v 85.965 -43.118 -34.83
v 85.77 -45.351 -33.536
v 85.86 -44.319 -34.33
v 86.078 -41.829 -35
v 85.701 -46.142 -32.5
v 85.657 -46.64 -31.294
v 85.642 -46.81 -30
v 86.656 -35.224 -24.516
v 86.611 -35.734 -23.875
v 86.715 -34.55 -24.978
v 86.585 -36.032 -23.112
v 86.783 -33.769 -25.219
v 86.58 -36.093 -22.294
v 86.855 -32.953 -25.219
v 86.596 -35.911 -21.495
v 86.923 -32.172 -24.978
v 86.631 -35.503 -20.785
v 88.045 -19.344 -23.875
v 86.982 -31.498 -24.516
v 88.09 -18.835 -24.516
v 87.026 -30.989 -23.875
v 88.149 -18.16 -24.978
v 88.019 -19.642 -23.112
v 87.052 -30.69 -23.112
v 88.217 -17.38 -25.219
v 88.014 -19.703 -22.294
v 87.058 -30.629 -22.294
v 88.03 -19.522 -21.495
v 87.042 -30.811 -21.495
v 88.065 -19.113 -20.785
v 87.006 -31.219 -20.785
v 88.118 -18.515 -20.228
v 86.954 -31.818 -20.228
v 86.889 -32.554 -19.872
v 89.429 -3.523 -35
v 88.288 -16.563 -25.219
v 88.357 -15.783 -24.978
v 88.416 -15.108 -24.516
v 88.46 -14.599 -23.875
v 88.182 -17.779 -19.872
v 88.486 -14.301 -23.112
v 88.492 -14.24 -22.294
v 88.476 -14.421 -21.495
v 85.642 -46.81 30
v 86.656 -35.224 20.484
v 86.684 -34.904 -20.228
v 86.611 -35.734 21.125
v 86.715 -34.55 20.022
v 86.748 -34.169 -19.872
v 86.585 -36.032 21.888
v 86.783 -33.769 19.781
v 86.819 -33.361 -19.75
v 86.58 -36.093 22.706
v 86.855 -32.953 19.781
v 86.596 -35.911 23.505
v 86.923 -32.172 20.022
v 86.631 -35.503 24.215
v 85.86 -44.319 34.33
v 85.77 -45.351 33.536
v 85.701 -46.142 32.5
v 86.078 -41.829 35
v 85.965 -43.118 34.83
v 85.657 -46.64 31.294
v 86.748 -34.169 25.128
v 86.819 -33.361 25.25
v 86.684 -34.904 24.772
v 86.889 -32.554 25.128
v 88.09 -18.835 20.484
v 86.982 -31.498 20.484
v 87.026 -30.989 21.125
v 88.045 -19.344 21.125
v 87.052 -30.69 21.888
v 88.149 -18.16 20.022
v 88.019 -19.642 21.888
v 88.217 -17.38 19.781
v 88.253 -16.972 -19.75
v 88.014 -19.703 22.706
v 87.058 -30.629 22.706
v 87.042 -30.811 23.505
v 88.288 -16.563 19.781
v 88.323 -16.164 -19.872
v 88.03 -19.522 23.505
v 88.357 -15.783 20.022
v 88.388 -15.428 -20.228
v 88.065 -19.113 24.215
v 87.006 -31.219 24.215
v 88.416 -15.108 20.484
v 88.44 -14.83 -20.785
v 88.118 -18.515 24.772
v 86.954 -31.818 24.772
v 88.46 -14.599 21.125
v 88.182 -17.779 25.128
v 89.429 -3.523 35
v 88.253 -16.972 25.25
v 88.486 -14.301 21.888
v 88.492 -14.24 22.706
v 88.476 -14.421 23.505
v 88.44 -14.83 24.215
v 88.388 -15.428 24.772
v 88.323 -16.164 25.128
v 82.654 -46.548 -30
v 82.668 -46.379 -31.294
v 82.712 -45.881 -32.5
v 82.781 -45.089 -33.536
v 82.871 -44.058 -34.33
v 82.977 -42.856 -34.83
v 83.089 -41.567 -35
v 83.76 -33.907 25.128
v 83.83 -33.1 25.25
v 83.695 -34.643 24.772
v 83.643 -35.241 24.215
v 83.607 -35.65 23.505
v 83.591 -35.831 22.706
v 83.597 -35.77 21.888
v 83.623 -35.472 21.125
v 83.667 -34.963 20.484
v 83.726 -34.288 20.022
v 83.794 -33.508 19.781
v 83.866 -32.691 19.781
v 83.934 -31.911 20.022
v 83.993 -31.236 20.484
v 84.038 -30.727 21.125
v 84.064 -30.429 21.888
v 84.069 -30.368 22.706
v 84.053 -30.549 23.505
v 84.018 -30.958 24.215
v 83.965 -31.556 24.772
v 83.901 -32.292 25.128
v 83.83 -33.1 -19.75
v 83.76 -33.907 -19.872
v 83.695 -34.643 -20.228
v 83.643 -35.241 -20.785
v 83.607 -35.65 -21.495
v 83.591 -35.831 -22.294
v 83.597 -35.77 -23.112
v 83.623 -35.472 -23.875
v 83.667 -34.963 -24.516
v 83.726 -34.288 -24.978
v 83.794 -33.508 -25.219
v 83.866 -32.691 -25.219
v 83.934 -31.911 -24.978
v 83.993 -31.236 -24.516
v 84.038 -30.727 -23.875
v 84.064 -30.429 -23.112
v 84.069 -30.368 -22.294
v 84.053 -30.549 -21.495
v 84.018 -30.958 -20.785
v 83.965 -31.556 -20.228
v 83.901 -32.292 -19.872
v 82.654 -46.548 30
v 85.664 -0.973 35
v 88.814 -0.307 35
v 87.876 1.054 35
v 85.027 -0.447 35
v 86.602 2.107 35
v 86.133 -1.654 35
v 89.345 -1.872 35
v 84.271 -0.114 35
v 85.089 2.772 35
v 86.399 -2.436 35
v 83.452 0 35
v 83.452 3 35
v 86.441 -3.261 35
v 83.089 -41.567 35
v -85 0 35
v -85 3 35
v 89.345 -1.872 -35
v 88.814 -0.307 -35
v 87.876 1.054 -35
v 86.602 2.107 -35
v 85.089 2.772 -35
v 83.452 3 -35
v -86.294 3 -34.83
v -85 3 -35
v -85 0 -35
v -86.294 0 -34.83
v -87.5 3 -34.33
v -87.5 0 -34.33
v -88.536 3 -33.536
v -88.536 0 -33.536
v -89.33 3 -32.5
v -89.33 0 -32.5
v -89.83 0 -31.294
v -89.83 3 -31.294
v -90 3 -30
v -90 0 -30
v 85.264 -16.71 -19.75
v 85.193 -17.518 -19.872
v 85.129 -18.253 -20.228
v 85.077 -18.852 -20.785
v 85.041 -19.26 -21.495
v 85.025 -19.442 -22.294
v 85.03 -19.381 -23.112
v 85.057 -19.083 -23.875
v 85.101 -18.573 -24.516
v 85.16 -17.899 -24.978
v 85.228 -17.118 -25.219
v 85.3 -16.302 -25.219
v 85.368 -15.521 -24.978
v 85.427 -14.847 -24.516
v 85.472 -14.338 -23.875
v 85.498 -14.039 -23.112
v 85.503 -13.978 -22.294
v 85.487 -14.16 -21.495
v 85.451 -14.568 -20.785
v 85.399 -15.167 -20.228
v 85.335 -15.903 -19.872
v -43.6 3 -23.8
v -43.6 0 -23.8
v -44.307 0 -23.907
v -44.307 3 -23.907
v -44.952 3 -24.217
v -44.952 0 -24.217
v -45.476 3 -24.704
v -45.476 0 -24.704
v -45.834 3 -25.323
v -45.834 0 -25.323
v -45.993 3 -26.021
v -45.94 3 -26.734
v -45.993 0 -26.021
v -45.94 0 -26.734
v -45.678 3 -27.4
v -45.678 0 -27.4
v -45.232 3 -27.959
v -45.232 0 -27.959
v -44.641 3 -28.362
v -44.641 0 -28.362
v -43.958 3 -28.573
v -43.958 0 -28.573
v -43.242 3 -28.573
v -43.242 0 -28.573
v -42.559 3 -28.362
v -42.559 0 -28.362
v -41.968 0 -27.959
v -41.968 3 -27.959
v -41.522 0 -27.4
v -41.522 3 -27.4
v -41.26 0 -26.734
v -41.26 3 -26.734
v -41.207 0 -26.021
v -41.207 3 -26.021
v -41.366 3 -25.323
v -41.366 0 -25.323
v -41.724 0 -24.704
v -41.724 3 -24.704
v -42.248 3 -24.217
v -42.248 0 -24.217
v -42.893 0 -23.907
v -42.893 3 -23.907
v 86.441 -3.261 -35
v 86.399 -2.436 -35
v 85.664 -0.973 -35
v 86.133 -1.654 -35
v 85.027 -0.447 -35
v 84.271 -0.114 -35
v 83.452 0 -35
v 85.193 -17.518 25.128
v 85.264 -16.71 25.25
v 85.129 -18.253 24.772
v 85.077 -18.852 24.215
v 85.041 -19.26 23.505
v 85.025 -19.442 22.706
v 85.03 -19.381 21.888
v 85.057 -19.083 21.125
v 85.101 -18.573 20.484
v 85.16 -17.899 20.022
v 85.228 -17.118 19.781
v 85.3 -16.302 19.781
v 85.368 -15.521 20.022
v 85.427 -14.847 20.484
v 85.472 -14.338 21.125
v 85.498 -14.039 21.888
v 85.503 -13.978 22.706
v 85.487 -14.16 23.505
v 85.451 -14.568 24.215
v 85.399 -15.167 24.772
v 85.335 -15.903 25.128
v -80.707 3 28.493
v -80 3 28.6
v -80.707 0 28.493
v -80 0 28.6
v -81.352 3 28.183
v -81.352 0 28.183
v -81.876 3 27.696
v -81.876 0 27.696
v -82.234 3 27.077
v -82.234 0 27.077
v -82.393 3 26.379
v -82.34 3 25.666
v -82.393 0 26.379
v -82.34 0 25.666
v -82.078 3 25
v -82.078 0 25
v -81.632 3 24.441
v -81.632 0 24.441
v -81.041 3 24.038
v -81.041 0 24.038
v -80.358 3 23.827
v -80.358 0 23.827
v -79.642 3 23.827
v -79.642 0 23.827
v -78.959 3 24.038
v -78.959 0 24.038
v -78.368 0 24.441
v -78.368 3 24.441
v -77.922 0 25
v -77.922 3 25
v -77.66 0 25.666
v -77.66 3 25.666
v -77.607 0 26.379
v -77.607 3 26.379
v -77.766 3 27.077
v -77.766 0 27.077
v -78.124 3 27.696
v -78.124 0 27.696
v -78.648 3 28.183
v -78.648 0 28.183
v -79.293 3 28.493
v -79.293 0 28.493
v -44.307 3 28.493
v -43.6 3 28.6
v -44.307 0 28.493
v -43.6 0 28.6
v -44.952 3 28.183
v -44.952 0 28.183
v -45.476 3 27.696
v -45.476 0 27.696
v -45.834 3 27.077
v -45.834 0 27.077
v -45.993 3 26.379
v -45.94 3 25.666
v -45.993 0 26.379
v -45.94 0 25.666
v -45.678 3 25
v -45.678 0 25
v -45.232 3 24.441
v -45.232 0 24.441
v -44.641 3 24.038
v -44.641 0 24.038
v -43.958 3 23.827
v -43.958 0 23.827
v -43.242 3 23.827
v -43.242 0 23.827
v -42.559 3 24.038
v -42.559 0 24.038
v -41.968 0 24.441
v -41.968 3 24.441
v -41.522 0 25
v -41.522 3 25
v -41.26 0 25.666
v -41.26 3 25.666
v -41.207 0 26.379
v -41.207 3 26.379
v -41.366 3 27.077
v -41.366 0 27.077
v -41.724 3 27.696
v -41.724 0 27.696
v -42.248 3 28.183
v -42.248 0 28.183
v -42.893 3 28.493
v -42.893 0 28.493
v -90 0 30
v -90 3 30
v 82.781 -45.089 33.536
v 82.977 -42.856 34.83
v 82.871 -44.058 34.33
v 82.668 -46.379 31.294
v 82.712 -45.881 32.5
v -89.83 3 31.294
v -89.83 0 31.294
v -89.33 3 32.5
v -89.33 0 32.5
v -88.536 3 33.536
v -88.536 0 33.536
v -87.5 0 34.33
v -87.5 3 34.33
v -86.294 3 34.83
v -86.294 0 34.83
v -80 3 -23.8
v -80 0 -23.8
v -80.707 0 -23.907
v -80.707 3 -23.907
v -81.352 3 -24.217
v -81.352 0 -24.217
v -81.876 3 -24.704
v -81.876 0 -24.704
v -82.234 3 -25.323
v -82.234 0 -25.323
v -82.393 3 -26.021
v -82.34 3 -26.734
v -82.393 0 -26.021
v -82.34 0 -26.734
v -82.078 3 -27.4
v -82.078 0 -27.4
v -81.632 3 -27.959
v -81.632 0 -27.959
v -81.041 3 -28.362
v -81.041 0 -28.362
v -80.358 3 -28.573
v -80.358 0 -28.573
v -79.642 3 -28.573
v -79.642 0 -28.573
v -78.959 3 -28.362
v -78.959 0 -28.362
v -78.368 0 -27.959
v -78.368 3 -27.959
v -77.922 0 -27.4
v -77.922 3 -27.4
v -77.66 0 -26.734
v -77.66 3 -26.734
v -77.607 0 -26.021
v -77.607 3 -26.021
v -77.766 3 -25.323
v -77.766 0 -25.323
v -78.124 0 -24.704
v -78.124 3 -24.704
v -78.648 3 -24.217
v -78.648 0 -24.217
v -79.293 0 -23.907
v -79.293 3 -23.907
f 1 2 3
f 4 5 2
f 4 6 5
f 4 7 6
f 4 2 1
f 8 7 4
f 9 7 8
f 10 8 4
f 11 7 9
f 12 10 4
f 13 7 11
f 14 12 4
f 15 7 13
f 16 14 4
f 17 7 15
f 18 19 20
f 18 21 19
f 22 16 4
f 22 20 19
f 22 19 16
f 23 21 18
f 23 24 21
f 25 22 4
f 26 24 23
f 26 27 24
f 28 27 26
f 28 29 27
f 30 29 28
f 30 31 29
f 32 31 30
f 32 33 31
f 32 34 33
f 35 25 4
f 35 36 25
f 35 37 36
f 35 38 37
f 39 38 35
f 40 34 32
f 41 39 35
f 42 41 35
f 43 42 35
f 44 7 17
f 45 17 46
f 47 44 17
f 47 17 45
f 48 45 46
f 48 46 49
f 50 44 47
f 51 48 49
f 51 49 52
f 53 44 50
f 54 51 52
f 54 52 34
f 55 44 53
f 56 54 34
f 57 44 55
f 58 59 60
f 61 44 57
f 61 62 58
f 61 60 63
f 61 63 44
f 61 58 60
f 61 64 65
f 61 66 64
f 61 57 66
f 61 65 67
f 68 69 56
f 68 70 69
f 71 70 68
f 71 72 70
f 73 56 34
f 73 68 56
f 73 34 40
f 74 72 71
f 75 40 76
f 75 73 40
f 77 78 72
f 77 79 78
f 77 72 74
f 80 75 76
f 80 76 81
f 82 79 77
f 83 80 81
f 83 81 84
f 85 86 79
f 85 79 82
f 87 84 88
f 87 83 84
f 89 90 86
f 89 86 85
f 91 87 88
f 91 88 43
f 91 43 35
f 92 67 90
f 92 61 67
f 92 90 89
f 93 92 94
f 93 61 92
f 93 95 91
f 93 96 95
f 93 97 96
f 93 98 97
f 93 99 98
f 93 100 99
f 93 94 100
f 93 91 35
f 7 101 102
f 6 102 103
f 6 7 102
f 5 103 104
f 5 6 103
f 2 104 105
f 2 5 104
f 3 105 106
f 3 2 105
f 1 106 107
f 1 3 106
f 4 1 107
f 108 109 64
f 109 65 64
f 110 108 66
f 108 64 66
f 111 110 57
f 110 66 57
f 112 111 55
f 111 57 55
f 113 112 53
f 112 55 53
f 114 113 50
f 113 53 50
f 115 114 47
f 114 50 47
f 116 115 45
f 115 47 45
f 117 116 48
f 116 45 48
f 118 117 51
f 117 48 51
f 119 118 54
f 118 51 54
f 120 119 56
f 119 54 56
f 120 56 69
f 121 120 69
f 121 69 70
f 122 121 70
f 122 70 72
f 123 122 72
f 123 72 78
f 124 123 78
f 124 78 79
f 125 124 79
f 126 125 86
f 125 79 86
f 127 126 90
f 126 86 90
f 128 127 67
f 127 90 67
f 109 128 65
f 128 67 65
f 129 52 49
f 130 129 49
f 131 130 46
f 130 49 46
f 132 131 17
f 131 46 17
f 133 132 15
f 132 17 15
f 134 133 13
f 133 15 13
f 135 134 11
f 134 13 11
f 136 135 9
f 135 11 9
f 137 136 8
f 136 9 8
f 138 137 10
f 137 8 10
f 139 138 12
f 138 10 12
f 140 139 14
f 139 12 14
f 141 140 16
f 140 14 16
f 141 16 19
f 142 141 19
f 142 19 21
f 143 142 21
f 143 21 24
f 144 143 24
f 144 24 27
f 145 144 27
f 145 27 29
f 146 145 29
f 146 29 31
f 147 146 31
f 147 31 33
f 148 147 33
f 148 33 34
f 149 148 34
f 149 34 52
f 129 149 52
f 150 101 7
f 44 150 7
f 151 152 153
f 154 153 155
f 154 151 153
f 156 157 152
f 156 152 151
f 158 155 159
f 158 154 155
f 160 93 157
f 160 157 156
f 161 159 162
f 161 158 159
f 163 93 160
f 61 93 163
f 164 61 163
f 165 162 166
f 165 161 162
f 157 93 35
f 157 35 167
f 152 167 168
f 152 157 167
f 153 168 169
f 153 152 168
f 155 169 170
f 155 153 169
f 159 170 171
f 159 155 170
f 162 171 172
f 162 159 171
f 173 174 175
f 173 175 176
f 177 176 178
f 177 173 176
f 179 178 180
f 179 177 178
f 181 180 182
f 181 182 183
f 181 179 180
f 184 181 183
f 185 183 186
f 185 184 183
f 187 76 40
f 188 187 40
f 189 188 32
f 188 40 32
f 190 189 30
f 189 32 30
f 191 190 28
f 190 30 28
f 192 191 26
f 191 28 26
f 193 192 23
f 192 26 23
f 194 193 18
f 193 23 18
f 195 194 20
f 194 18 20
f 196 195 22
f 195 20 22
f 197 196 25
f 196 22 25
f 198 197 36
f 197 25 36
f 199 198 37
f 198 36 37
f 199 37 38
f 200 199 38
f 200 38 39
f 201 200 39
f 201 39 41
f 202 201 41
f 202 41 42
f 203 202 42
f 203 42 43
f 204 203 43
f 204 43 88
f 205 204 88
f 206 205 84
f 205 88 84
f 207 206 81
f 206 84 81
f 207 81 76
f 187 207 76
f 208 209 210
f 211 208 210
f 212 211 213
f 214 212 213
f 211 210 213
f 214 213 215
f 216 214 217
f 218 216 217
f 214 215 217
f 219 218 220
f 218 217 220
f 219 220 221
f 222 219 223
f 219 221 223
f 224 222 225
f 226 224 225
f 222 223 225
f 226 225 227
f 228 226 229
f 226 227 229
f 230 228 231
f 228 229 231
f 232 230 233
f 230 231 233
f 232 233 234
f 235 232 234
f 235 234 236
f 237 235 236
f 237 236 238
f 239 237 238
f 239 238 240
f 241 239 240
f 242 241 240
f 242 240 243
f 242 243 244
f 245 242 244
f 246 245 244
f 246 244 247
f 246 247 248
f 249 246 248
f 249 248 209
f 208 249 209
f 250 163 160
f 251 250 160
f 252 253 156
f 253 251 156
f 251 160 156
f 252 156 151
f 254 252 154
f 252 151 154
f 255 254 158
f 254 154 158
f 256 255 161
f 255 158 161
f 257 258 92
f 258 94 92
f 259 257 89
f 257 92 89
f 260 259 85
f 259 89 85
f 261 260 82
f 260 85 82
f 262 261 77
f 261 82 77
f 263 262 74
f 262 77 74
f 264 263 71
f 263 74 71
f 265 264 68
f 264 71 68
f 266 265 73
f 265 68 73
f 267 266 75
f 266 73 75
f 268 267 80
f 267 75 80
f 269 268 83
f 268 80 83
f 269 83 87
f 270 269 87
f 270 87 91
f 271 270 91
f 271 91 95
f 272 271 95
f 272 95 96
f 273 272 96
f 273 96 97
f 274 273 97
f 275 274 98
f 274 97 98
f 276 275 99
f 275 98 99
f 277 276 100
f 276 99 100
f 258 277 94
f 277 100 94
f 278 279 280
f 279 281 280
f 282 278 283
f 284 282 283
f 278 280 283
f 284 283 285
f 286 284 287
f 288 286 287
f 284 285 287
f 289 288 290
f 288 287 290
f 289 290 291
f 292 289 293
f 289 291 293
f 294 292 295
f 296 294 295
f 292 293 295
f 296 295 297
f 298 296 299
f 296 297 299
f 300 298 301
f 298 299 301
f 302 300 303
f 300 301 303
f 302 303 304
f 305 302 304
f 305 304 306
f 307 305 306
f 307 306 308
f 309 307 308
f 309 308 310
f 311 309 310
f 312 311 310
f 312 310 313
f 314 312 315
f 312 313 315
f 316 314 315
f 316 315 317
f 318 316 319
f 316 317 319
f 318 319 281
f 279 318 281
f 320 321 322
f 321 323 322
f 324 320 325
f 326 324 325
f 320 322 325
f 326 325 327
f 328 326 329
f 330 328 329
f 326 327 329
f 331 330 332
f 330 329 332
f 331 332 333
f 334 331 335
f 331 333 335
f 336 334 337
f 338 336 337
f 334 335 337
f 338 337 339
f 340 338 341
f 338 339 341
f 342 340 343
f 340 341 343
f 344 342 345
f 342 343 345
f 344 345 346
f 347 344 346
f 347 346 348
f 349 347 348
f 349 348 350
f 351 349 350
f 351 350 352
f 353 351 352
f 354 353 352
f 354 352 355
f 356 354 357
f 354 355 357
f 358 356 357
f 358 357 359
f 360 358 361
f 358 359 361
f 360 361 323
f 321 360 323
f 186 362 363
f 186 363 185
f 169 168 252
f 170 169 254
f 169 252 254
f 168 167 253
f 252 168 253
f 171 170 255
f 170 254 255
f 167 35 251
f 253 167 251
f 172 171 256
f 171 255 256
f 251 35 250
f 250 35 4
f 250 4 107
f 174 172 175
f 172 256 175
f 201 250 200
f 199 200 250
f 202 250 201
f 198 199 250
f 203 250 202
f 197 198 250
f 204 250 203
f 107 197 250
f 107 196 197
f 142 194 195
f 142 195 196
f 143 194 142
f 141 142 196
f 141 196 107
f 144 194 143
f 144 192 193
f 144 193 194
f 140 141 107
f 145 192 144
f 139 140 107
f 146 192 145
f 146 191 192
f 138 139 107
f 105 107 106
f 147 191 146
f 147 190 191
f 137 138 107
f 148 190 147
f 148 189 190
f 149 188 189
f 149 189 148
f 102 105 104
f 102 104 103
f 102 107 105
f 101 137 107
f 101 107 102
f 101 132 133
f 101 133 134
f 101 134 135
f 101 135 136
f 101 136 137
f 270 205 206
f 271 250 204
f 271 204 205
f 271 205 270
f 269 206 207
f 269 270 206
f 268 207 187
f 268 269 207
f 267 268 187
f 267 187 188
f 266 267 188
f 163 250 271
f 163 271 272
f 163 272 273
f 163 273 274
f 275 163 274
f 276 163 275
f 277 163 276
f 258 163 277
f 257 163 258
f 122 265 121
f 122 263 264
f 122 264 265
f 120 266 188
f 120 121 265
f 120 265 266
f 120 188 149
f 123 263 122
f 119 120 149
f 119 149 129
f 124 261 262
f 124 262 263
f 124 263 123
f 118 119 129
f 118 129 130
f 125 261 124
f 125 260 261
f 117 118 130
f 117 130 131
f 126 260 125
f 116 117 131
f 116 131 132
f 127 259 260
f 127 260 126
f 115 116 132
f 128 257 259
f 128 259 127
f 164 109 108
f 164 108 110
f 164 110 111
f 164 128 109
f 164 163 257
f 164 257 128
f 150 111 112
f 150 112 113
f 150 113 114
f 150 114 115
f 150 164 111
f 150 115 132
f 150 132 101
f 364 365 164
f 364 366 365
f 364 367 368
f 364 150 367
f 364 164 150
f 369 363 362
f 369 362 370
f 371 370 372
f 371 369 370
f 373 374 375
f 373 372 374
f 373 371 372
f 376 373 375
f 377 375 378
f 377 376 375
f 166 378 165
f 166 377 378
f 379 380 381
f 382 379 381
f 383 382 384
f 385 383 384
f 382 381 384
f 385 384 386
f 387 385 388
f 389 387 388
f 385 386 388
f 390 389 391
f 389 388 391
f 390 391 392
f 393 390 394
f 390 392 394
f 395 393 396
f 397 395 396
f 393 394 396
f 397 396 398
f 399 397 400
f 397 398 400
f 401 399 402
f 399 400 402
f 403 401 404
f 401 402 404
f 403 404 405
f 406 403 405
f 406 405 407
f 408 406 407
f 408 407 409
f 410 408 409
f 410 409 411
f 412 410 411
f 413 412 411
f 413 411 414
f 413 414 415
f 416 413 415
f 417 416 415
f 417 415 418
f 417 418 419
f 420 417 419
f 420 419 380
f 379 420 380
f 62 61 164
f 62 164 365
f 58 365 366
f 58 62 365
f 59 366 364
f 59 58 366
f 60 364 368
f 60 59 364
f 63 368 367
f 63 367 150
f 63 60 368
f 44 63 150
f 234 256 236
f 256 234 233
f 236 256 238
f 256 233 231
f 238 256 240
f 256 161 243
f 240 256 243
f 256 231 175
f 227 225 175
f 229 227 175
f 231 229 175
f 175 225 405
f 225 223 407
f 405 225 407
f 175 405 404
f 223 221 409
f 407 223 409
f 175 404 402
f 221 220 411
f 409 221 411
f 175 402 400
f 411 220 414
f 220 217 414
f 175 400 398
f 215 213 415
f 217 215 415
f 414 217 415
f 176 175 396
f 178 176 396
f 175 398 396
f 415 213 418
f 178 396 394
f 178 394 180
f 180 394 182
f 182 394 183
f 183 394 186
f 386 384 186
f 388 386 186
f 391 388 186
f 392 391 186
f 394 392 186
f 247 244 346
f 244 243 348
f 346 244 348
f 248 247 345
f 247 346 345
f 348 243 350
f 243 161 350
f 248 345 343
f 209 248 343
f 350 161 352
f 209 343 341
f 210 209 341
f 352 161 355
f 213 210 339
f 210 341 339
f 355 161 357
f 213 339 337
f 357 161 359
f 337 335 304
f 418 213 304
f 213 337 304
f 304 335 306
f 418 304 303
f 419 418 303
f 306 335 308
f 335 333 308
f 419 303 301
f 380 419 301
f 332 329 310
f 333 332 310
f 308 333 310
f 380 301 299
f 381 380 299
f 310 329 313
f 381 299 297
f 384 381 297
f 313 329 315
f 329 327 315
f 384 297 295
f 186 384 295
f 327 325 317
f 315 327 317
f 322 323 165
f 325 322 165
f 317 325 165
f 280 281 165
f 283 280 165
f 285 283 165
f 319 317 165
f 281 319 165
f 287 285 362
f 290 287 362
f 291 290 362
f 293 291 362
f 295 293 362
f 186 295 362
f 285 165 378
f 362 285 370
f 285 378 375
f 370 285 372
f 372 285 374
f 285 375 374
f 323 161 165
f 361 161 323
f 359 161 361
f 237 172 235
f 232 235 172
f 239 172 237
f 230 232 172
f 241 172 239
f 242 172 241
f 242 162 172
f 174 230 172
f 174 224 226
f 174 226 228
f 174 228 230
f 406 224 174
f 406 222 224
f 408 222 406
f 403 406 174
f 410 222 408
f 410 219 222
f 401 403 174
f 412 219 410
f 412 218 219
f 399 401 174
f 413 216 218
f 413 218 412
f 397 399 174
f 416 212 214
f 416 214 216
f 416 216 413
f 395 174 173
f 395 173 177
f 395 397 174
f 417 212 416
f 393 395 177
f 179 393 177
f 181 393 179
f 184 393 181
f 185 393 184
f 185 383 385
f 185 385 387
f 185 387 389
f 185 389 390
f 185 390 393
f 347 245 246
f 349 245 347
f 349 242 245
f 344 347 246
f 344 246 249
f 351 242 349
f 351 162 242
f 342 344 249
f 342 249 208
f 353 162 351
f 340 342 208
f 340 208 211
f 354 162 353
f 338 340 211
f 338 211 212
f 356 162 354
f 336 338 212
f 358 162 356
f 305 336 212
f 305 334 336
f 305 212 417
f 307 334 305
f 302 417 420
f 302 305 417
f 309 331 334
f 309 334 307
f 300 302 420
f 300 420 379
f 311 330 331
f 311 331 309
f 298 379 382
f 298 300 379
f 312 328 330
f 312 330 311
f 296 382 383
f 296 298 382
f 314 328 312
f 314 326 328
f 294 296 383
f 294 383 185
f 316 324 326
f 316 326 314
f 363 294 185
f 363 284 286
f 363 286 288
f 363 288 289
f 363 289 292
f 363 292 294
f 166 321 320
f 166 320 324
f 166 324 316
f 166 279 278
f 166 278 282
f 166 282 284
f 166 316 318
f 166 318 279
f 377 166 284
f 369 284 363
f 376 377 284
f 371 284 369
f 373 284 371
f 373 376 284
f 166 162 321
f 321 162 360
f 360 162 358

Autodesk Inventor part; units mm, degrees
ref_plane "YZ Plane" through (0, 0, 0) normal (1, 0, 0) x (0, 1, 0)
ref_plane "XZ Plane" through (0, 0, 0) normal (0, 1, 0) x (-1, 0, 0)
ref_plane "XY Plane" through (0, 0, 0) normal (0, 0, 1) x (1, 0, 0)
sketch "Sketch1" plane through (0, 0, 0) normal (0, 1, 0) x (-1, 0, 0)
  line L0 (-90, 35) -> (90, 35)
  line L1 (90, 35) -> (90, -35)
  line L2 (90, -35) -> (-90, -35)
  line L3 (-90, -35) -> (-90, 35)
  line L4 (-90, 35) -> (90, -35) construction
  line L5 (90, 35) -> (-90, -35) construction
  point P0 (0, 0)
  dimension "d0" = 70
  dimension "d1" = 180
extrude "Plate1" add sketch "Sketch1" along normal blind 3
sketch "Sketch2" plane through (87.0114, 3.2615, 35) normal (0.9961947, -0.0871557, 0) x (0.0871557, 0.9961947, 0)
  line L0 (0, -70) -> (0, 0)
  line L1 (0, 0) -> (-50, 0)
  line L2 (-50, 0) -> (-50, -70)
  line L3 (-50, -70) -> (0, -70)
edge flange "Flange1" height 50 angle 95 thickness 3 bend radius 3 thickness toward (0.9961947, -0.0871557, 0) relief tear relief width 3 relief depth 1.5 edges at (90, 0, 0) wall of the first edge with corners at (87.0114, 3.2615, -35) (87.0114, 3.2615, 35) (82.6536, -46.5483, 35) (82.6536, -46.5483, -35)
bend "Bend1"
corner "Corner1"
sketch "Sketch3" plane through (0, 3, 0) normal (0, 1, 0) x (1, 0, 0)
  line L0 (-43.6, -26.2) -> (-80, -26.2) construction
  line L1 (-80, -26.2) -> (-80, 26.2) construction
  line L2 (-80, 26.2) -> (-43.6, 26.2) construction
  line L3 (-43.6, 26.2) -> (-43.6, -26.2) construction
  line L4 (-43.6, -26.2) -> (-80, 26.2) construction
  line L5 (-80, -26.2) -> (-43.6, 26.2) construction
  line L6 (-90, -35) -> (-90, 35) construction
  point P0 (0, 0)
  point P1 (-61.8, 0)
  dimension "d13" = 52.4
  dimension "d14" = 36.4
  dimension "d15" = 10
hole "Hole1" at (-80, 3, 26.2) at (-80, 3, -26.2) at (-43.6, 3, -26.2) at (-43.6, 3, 26.2) direction (0, -1, 0) diameter 4.8 end through all clearance for "Countersunk Flat Head Screw DIN EN ISO 2009" size "M4" standard "DIN"
sketch "Sketch4" plane through (82.6536, -46.5483, -35) normal (-0.9961947, 0.0871557, 0) x (0, 0, 1)
  line L0 (12.5, 13.5) -> (57.5, 13.5) construction
  line L1 (57.5, 13.5) -> (57.5, 29.9521) construction
  line L2 (57.5, 29.9521) -> (12.5, 29.9521) construction
  line L3 (12.5, 29.9521) -> (12.5, 13.5) construction
  line L4 (12.5, 13.5) -> (57.5, 29.9521) construction
  line L5 (57.5, 13.5) -> (12.5, 29.9521) construction
  line L6 (70, 43.4521) -> (0, 43.4521) construction
  line L7 (0, 43.4521) -> (0, 0) construction
  line L8 (0, 0) -> (70, 0) construction
  line L9 (70, 43.4521) -> (70, 0) construction
  circle A0 centre (57.5, 29.9521) radius 2.75
  line L10 (53.5346, 32.7021) -> (62.0591, 32.7021)
  point P0 (35, 39.1674)
  point P1 (35, 21.7261)
  point P2 (70, 21.7261)
  dimension "d23" = 0
  dimension "d24" = 70
  dimension "d25" = 45
  dimension "d26" = 13.5
  dimension "d27" = 16.4521
  dimension "d28" = 5.5
  dimension "d29" = 10.75
hole "Hole2" at (85.2641, -16.7101, -22.5) at (83.8302, -33.0996, -22.5) at (85.2641, -16.7101, 22.5) at (83.8302, -33.0996, 22.5) direction (0.9961947, -0.0871557, 0) diameter 5.5 end through all clearance for "Countersunk Flat Head Screw DIN EN ISO 2009" size "M5" standard "DIN"
fillet "Fillet1" radius 5 4 edges at (84.1479, -46.679, 35) (84.1479, -46.679, -35) (-90, 1.5, 35) (-90, 1.5, -35)
equation "\"d21\" = Thickness"
equation "\"d35\" = Thickness"
equation "\"d2\" = Thickness"
equation "\"d3\" = BendReliefWidth"
equation "\"d4\" = BendReliefDepth"
equation "\"d5\" = MinimumRemnant"
equation "\"d6\" = TransitionRadius"
equation "\"d9\" = BendRadius"
equation "\"d10\" = CornerReliefSize"
equation "\"d11\" = GapSize"
equation "\"d12\" = JacobiRadiusSize"
equation "\"BendRadius\" = Thickness"
equation "\"BendReliefWidth\" = Thickness"
equation "\"BendReliefDepth\" = 0.5 * Thickness"
equation "\"CornerReliefSize\" = 4 * Thickness"
equation "\"MinimumRemnant\" = 2 * Thickness"
equation "\"TransitionRadius\" = BendRadius"
equation "\"JacobiRadiusSize\" = BendRadius"
equation "\"GapSize\" = Thickness"
equation "\"Thickness\" = 3"
properties part number "26062025_2" material "AISI 304"
